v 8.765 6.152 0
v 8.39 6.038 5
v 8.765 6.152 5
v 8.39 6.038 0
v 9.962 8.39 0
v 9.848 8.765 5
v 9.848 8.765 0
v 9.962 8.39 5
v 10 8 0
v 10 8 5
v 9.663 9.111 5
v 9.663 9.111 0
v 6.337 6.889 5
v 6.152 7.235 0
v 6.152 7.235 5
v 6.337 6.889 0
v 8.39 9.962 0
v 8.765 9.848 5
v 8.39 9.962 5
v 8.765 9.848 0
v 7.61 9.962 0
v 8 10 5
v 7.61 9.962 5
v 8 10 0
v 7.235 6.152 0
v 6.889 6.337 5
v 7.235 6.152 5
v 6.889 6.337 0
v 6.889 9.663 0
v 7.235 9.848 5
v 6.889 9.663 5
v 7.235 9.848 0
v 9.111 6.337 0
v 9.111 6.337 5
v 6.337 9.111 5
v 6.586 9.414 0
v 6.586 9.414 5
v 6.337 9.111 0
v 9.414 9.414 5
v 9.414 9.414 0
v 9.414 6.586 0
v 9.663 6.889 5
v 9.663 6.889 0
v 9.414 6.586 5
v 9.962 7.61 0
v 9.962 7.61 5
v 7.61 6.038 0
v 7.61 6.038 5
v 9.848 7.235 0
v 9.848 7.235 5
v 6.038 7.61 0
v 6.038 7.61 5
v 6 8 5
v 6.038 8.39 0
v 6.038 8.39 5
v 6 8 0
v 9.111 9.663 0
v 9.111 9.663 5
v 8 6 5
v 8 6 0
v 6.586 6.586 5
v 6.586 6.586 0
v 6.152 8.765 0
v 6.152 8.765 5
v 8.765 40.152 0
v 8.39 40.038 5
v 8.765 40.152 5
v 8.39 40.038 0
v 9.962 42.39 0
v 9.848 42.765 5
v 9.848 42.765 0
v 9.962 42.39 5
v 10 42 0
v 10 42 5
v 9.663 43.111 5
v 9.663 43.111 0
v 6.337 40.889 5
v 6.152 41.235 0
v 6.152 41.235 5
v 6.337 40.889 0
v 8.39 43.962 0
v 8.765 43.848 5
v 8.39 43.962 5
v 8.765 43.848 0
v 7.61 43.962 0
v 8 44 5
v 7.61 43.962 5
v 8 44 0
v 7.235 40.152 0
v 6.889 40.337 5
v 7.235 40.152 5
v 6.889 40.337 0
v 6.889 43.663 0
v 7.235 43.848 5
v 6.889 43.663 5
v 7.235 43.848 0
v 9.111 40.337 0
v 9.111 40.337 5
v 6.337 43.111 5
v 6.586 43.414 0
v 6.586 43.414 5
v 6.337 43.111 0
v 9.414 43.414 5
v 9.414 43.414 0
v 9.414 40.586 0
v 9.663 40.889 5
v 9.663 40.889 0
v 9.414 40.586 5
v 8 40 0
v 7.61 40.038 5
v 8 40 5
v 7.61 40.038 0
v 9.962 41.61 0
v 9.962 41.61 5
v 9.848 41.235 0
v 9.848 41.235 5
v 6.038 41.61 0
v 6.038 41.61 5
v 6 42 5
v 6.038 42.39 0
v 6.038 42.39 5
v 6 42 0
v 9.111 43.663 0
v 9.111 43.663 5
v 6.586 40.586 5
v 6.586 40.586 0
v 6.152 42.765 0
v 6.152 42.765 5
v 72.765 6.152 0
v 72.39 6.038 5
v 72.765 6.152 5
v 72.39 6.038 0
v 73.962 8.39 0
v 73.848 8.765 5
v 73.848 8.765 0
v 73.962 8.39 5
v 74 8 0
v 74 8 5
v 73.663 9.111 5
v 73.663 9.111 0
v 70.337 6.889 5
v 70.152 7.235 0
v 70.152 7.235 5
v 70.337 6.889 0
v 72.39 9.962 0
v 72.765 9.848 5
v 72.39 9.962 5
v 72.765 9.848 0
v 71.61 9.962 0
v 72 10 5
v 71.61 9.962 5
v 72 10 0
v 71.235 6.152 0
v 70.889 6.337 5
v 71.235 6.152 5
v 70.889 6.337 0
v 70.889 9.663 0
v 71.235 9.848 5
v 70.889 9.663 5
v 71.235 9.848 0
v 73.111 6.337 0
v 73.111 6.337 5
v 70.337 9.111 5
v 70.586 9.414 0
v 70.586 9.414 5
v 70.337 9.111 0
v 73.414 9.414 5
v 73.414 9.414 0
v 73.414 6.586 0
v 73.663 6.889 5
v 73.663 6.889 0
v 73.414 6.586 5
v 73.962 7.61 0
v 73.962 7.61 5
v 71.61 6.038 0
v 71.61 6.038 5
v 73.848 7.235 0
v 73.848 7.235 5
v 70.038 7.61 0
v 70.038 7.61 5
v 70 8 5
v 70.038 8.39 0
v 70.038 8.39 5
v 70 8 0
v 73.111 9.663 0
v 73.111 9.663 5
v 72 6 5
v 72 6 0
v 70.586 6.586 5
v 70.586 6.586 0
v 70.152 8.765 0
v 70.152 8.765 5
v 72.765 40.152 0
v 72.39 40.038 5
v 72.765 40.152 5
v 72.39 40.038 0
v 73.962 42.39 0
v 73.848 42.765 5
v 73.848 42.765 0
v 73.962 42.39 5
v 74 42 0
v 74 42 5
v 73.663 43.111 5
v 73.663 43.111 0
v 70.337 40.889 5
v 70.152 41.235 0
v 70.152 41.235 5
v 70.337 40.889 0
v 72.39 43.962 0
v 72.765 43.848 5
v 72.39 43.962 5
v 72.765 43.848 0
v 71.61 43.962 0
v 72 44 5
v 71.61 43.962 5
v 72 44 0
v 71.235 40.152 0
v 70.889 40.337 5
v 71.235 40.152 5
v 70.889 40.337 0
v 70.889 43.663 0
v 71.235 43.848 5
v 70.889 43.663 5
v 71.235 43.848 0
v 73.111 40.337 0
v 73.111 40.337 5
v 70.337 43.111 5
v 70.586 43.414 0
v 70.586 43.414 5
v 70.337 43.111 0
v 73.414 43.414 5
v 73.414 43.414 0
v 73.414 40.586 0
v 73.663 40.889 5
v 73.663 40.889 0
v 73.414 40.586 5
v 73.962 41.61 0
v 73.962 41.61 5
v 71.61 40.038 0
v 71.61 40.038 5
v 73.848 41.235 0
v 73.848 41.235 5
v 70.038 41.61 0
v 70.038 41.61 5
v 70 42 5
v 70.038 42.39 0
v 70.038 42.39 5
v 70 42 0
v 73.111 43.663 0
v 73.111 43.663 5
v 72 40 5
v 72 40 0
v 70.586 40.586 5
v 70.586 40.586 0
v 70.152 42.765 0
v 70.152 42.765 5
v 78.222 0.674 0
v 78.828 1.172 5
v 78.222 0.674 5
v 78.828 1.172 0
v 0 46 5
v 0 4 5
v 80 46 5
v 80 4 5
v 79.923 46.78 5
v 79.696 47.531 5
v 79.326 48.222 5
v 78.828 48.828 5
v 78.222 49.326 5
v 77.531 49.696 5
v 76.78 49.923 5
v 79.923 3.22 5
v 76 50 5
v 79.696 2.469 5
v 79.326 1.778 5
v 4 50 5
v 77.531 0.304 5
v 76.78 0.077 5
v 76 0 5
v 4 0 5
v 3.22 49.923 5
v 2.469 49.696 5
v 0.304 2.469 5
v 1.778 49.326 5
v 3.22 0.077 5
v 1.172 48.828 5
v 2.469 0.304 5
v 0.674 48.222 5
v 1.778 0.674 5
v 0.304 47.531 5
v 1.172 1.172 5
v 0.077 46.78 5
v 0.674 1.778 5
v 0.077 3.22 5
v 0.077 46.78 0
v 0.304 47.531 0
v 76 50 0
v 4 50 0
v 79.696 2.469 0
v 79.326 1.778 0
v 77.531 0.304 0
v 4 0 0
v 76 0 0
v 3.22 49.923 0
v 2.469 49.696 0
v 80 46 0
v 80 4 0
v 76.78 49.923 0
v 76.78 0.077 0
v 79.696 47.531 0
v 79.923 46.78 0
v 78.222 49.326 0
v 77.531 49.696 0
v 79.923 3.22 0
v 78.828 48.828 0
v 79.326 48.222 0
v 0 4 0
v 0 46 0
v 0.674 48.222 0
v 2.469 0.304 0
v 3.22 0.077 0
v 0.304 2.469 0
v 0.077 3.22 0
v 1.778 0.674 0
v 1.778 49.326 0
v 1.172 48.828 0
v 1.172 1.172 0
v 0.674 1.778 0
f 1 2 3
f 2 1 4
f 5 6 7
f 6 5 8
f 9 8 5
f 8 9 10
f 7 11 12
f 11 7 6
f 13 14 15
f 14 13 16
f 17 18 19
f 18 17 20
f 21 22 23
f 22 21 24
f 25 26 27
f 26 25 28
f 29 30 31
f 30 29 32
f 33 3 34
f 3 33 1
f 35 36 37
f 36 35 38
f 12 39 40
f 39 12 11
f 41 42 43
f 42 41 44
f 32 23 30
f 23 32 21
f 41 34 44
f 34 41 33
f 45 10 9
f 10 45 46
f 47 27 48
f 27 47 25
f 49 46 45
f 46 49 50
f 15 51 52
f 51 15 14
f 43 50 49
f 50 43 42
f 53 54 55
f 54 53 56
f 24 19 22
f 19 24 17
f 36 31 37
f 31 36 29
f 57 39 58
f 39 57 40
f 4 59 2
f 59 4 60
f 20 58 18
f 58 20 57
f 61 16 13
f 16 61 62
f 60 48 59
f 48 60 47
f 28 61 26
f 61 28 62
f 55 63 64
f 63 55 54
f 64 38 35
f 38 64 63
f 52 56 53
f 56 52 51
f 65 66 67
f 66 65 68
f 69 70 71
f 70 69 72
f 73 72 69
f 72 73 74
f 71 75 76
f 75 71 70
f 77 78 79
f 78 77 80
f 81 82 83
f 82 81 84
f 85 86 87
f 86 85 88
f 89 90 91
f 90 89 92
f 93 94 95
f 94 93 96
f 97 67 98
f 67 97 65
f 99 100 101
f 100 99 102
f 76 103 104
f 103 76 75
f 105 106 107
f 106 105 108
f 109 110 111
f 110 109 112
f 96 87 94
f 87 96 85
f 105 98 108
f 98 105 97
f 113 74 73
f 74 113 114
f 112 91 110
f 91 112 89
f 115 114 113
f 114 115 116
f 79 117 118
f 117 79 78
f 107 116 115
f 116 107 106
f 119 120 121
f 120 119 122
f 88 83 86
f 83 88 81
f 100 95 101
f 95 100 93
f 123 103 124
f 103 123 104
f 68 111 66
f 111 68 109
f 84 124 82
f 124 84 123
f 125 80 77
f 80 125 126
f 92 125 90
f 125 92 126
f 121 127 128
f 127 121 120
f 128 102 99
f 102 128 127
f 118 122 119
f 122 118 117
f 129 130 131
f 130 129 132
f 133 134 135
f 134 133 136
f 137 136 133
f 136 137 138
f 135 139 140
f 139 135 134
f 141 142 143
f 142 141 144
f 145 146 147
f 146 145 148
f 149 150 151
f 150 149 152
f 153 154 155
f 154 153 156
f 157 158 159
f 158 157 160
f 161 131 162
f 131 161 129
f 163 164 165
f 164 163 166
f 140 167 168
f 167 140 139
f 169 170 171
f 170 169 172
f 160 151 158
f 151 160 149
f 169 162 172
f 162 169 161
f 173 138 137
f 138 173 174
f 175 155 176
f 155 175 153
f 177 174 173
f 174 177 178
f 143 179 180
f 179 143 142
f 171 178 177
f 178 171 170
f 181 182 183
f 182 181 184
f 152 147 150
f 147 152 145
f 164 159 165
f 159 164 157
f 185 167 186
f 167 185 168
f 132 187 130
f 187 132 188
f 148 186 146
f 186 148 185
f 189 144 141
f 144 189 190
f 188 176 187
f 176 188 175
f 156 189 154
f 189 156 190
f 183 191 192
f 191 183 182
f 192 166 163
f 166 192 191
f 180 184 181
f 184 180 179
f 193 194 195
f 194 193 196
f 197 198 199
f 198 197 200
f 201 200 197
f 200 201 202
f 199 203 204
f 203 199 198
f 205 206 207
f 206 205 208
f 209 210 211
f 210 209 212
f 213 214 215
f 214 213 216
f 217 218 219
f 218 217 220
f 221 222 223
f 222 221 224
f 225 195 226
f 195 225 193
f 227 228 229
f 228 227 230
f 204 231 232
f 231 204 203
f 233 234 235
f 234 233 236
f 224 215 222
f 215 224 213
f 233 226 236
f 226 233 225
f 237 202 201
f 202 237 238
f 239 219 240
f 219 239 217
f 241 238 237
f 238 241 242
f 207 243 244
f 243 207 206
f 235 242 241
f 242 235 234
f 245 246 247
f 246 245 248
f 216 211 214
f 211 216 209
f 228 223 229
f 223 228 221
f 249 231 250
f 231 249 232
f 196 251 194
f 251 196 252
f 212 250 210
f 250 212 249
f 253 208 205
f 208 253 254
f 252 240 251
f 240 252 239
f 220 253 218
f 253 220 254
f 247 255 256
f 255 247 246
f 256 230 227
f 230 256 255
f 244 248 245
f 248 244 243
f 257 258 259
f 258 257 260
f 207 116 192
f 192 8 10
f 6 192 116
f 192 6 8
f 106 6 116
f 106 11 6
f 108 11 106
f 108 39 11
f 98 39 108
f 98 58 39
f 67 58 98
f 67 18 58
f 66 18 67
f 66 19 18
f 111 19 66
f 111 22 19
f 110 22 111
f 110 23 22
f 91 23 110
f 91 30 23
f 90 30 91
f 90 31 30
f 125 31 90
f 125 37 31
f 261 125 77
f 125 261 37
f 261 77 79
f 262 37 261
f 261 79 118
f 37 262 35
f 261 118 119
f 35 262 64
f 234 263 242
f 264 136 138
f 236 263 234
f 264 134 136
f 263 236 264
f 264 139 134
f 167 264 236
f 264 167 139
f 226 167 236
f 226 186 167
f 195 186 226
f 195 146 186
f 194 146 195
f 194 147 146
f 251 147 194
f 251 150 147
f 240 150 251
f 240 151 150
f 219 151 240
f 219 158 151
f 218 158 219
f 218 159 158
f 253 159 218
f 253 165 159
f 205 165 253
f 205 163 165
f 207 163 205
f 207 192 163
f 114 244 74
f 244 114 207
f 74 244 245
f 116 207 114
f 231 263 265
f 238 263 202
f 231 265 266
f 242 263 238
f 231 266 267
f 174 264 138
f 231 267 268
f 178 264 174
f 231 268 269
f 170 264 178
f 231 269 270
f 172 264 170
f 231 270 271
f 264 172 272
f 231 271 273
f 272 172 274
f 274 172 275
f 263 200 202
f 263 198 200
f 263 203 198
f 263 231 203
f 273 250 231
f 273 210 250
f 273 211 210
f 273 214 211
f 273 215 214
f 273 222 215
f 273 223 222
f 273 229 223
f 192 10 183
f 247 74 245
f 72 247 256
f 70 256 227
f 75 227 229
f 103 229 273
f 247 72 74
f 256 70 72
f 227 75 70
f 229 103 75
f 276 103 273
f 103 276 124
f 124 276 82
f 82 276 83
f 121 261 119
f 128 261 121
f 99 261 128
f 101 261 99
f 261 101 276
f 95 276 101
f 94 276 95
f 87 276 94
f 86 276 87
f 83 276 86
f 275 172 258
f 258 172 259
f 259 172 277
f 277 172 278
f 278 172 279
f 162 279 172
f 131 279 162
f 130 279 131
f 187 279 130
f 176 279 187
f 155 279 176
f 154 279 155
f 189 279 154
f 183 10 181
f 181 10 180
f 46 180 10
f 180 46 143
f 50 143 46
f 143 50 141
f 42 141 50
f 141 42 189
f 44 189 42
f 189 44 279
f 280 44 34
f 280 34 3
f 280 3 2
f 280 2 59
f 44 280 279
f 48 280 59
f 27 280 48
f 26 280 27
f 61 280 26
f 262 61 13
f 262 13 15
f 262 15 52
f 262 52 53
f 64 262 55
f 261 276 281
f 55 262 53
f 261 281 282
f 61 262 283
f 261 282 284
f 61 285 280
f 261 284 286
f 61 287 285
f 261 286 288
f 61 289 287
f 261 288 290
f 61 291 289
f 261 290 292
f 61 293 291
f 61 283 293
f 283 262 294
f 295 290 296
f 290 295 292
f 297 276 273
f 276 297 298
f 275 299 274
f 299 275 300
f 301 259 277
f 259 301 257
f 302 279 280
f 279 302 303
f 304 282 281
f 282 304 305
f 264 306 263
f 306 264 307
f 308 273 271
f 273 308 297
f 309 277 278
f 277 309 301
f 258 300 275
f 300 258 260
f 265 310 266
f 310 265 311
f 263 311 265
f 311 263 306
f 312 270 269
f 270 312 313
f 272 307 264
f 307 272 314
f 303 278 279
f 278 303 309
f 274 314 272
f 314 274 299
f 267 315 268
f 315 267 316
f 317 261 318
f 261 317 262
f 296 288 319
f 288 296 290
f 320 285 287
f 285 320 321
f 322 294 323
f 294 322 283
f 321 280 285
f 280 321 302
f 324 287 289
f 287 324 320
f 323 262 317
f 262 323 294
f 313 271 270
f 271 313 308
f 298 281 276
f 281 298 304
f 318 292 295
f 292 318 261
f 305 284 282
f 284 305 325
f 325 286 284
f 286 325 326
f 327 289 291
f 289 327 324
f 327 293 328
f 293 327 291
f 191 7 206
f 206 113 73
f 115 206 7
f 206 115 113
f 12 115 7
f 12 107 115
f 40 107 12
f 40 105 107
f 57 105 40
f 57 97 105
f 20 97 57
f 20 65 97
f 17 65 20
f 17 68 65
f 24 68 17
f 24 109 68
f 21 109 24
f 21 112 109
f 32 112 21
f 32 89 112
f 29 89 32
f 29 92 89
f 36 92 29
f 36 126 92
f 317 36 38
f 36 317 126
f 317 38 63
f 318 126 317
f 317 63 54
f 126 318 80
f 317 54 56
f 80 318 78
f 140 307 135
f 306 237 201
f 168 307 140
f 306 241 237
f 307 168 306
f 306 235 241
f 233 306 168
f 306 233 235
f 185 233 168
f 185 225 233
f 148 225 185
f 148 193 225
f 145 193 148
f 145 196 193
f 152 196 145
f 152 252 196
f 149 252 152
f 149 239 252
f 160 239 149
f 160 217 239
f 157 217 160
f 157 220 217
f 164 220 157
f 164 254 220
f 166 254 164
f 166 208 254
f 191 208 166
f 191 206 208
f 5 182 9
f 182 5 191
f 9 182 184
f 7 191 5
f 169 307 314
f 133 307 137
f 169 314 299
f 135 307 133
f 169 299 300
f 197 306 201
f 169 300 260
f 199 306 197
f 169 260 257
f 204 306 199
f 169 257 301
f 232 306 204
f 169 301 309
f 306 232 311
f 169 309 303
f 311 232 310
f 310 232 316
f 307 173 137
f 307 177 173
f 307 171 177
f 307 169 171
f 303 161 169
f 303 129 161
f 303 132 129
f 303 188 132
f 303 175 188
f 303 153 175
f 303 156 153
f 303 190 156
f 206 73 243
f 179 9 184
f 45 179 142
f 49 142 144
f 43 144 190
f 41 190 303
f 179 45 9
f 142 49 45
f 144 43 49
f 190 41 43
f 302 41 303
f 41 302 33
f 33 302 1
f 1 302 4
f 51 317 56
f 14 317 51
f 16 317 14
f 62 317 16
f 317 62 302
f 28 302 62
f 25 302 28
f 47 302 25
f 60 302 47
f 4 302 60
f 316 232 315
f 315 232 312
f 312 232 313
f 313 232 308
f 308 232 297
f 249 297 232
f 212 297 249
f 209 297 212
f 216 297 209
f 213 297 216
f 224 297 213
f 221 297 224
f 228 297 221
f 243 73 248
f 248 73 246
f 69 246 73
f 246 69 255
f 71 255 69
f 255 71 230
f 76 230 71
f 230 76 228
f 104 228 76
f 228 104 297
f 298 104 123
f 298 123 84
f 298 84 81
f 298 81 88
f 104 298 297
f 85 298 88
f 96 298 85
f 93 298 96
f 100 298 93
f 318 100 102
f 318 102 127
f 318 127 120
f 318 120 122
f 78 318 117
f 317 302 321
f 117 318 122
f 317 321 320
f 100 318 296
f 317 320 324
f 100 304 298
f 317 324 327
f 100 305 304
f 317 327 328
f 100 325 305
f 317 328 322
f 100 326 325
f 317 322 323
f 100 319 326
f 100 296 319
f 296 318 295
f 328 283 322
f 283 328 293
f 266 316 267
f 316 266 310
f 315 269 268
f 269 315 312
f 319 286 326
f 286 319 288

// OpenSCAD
// mechanical_plate.scad
// Hand-authored parametric rectangular mounting plate example for the
// ai-3d-factory examples/ library (examples/mechanical-plate/).
//
// Not generated by `factory generate-openscad` - no built-in OpenSCAD
// template covers a rounded-corner plate with mounting holes yet (the
// built-in templates are test-cube/nameplate/sign/multipart-nameplate,
// see factory/openscad/templates.py). Parameter names deliberately mirror
// `factory generate-cadquery --template mechanical-plate`
// (factory/cad/cadquery_backend.py) so the two backends stay easy to
// compare; CadQuery is an optional dependency not installed in this
// environment, so this example uses OpenSCAD, the backend that's actually
// usable here. See docs/cad-backends.md.
//
// This repo does not run OpenSCAD automatically. Geometry sanity check
// passed does not mean print-ready - human slicer review is still
// required. See AGENT.md.

// ---- Parameters (all in millimeters) ----
length_mm = 80;
width_mm = 50;
thickness_mm = 5;
corner_radius_mm = 4;    // set to 0 for square corners
hole_diameter_mm = 4;    // set to 0 to omit the 4 corner mounting holes
hole_margin_mm = 8;      // distance of hole centers from each edge

module plate_outline() {
    if (corner_radius_mm > 0) {
        hull() {
            for (x = [corner_radius_mm, length_mm - corner_radius_mm])
                for (y = [corner_radius_mm, width_mm - corner_radius_mm])
                    translate([x, y, 0])
                        cylinder(r = corner_radius_mm, h = thickness_mm, $fn = 32);
        }
    } else {
        cube([length_mm, width_mm, thickness_mm]);
    }
}

module mounting_holes() {
    for (x = [hole_margin_mm, length_mm - hole_margin_mm])
        for (y = [hole_margin_mm, width_mm - hole_margin_mm])
            translate([x, y, -1])
                cylinder(d = hole_diameter_mm, h = thickness_mm + 2, $fn = 32);
}

difference() {
    plate_outline();
    if (hole_diameter_mm > 0) {
        mounting_holes();
    }
}
